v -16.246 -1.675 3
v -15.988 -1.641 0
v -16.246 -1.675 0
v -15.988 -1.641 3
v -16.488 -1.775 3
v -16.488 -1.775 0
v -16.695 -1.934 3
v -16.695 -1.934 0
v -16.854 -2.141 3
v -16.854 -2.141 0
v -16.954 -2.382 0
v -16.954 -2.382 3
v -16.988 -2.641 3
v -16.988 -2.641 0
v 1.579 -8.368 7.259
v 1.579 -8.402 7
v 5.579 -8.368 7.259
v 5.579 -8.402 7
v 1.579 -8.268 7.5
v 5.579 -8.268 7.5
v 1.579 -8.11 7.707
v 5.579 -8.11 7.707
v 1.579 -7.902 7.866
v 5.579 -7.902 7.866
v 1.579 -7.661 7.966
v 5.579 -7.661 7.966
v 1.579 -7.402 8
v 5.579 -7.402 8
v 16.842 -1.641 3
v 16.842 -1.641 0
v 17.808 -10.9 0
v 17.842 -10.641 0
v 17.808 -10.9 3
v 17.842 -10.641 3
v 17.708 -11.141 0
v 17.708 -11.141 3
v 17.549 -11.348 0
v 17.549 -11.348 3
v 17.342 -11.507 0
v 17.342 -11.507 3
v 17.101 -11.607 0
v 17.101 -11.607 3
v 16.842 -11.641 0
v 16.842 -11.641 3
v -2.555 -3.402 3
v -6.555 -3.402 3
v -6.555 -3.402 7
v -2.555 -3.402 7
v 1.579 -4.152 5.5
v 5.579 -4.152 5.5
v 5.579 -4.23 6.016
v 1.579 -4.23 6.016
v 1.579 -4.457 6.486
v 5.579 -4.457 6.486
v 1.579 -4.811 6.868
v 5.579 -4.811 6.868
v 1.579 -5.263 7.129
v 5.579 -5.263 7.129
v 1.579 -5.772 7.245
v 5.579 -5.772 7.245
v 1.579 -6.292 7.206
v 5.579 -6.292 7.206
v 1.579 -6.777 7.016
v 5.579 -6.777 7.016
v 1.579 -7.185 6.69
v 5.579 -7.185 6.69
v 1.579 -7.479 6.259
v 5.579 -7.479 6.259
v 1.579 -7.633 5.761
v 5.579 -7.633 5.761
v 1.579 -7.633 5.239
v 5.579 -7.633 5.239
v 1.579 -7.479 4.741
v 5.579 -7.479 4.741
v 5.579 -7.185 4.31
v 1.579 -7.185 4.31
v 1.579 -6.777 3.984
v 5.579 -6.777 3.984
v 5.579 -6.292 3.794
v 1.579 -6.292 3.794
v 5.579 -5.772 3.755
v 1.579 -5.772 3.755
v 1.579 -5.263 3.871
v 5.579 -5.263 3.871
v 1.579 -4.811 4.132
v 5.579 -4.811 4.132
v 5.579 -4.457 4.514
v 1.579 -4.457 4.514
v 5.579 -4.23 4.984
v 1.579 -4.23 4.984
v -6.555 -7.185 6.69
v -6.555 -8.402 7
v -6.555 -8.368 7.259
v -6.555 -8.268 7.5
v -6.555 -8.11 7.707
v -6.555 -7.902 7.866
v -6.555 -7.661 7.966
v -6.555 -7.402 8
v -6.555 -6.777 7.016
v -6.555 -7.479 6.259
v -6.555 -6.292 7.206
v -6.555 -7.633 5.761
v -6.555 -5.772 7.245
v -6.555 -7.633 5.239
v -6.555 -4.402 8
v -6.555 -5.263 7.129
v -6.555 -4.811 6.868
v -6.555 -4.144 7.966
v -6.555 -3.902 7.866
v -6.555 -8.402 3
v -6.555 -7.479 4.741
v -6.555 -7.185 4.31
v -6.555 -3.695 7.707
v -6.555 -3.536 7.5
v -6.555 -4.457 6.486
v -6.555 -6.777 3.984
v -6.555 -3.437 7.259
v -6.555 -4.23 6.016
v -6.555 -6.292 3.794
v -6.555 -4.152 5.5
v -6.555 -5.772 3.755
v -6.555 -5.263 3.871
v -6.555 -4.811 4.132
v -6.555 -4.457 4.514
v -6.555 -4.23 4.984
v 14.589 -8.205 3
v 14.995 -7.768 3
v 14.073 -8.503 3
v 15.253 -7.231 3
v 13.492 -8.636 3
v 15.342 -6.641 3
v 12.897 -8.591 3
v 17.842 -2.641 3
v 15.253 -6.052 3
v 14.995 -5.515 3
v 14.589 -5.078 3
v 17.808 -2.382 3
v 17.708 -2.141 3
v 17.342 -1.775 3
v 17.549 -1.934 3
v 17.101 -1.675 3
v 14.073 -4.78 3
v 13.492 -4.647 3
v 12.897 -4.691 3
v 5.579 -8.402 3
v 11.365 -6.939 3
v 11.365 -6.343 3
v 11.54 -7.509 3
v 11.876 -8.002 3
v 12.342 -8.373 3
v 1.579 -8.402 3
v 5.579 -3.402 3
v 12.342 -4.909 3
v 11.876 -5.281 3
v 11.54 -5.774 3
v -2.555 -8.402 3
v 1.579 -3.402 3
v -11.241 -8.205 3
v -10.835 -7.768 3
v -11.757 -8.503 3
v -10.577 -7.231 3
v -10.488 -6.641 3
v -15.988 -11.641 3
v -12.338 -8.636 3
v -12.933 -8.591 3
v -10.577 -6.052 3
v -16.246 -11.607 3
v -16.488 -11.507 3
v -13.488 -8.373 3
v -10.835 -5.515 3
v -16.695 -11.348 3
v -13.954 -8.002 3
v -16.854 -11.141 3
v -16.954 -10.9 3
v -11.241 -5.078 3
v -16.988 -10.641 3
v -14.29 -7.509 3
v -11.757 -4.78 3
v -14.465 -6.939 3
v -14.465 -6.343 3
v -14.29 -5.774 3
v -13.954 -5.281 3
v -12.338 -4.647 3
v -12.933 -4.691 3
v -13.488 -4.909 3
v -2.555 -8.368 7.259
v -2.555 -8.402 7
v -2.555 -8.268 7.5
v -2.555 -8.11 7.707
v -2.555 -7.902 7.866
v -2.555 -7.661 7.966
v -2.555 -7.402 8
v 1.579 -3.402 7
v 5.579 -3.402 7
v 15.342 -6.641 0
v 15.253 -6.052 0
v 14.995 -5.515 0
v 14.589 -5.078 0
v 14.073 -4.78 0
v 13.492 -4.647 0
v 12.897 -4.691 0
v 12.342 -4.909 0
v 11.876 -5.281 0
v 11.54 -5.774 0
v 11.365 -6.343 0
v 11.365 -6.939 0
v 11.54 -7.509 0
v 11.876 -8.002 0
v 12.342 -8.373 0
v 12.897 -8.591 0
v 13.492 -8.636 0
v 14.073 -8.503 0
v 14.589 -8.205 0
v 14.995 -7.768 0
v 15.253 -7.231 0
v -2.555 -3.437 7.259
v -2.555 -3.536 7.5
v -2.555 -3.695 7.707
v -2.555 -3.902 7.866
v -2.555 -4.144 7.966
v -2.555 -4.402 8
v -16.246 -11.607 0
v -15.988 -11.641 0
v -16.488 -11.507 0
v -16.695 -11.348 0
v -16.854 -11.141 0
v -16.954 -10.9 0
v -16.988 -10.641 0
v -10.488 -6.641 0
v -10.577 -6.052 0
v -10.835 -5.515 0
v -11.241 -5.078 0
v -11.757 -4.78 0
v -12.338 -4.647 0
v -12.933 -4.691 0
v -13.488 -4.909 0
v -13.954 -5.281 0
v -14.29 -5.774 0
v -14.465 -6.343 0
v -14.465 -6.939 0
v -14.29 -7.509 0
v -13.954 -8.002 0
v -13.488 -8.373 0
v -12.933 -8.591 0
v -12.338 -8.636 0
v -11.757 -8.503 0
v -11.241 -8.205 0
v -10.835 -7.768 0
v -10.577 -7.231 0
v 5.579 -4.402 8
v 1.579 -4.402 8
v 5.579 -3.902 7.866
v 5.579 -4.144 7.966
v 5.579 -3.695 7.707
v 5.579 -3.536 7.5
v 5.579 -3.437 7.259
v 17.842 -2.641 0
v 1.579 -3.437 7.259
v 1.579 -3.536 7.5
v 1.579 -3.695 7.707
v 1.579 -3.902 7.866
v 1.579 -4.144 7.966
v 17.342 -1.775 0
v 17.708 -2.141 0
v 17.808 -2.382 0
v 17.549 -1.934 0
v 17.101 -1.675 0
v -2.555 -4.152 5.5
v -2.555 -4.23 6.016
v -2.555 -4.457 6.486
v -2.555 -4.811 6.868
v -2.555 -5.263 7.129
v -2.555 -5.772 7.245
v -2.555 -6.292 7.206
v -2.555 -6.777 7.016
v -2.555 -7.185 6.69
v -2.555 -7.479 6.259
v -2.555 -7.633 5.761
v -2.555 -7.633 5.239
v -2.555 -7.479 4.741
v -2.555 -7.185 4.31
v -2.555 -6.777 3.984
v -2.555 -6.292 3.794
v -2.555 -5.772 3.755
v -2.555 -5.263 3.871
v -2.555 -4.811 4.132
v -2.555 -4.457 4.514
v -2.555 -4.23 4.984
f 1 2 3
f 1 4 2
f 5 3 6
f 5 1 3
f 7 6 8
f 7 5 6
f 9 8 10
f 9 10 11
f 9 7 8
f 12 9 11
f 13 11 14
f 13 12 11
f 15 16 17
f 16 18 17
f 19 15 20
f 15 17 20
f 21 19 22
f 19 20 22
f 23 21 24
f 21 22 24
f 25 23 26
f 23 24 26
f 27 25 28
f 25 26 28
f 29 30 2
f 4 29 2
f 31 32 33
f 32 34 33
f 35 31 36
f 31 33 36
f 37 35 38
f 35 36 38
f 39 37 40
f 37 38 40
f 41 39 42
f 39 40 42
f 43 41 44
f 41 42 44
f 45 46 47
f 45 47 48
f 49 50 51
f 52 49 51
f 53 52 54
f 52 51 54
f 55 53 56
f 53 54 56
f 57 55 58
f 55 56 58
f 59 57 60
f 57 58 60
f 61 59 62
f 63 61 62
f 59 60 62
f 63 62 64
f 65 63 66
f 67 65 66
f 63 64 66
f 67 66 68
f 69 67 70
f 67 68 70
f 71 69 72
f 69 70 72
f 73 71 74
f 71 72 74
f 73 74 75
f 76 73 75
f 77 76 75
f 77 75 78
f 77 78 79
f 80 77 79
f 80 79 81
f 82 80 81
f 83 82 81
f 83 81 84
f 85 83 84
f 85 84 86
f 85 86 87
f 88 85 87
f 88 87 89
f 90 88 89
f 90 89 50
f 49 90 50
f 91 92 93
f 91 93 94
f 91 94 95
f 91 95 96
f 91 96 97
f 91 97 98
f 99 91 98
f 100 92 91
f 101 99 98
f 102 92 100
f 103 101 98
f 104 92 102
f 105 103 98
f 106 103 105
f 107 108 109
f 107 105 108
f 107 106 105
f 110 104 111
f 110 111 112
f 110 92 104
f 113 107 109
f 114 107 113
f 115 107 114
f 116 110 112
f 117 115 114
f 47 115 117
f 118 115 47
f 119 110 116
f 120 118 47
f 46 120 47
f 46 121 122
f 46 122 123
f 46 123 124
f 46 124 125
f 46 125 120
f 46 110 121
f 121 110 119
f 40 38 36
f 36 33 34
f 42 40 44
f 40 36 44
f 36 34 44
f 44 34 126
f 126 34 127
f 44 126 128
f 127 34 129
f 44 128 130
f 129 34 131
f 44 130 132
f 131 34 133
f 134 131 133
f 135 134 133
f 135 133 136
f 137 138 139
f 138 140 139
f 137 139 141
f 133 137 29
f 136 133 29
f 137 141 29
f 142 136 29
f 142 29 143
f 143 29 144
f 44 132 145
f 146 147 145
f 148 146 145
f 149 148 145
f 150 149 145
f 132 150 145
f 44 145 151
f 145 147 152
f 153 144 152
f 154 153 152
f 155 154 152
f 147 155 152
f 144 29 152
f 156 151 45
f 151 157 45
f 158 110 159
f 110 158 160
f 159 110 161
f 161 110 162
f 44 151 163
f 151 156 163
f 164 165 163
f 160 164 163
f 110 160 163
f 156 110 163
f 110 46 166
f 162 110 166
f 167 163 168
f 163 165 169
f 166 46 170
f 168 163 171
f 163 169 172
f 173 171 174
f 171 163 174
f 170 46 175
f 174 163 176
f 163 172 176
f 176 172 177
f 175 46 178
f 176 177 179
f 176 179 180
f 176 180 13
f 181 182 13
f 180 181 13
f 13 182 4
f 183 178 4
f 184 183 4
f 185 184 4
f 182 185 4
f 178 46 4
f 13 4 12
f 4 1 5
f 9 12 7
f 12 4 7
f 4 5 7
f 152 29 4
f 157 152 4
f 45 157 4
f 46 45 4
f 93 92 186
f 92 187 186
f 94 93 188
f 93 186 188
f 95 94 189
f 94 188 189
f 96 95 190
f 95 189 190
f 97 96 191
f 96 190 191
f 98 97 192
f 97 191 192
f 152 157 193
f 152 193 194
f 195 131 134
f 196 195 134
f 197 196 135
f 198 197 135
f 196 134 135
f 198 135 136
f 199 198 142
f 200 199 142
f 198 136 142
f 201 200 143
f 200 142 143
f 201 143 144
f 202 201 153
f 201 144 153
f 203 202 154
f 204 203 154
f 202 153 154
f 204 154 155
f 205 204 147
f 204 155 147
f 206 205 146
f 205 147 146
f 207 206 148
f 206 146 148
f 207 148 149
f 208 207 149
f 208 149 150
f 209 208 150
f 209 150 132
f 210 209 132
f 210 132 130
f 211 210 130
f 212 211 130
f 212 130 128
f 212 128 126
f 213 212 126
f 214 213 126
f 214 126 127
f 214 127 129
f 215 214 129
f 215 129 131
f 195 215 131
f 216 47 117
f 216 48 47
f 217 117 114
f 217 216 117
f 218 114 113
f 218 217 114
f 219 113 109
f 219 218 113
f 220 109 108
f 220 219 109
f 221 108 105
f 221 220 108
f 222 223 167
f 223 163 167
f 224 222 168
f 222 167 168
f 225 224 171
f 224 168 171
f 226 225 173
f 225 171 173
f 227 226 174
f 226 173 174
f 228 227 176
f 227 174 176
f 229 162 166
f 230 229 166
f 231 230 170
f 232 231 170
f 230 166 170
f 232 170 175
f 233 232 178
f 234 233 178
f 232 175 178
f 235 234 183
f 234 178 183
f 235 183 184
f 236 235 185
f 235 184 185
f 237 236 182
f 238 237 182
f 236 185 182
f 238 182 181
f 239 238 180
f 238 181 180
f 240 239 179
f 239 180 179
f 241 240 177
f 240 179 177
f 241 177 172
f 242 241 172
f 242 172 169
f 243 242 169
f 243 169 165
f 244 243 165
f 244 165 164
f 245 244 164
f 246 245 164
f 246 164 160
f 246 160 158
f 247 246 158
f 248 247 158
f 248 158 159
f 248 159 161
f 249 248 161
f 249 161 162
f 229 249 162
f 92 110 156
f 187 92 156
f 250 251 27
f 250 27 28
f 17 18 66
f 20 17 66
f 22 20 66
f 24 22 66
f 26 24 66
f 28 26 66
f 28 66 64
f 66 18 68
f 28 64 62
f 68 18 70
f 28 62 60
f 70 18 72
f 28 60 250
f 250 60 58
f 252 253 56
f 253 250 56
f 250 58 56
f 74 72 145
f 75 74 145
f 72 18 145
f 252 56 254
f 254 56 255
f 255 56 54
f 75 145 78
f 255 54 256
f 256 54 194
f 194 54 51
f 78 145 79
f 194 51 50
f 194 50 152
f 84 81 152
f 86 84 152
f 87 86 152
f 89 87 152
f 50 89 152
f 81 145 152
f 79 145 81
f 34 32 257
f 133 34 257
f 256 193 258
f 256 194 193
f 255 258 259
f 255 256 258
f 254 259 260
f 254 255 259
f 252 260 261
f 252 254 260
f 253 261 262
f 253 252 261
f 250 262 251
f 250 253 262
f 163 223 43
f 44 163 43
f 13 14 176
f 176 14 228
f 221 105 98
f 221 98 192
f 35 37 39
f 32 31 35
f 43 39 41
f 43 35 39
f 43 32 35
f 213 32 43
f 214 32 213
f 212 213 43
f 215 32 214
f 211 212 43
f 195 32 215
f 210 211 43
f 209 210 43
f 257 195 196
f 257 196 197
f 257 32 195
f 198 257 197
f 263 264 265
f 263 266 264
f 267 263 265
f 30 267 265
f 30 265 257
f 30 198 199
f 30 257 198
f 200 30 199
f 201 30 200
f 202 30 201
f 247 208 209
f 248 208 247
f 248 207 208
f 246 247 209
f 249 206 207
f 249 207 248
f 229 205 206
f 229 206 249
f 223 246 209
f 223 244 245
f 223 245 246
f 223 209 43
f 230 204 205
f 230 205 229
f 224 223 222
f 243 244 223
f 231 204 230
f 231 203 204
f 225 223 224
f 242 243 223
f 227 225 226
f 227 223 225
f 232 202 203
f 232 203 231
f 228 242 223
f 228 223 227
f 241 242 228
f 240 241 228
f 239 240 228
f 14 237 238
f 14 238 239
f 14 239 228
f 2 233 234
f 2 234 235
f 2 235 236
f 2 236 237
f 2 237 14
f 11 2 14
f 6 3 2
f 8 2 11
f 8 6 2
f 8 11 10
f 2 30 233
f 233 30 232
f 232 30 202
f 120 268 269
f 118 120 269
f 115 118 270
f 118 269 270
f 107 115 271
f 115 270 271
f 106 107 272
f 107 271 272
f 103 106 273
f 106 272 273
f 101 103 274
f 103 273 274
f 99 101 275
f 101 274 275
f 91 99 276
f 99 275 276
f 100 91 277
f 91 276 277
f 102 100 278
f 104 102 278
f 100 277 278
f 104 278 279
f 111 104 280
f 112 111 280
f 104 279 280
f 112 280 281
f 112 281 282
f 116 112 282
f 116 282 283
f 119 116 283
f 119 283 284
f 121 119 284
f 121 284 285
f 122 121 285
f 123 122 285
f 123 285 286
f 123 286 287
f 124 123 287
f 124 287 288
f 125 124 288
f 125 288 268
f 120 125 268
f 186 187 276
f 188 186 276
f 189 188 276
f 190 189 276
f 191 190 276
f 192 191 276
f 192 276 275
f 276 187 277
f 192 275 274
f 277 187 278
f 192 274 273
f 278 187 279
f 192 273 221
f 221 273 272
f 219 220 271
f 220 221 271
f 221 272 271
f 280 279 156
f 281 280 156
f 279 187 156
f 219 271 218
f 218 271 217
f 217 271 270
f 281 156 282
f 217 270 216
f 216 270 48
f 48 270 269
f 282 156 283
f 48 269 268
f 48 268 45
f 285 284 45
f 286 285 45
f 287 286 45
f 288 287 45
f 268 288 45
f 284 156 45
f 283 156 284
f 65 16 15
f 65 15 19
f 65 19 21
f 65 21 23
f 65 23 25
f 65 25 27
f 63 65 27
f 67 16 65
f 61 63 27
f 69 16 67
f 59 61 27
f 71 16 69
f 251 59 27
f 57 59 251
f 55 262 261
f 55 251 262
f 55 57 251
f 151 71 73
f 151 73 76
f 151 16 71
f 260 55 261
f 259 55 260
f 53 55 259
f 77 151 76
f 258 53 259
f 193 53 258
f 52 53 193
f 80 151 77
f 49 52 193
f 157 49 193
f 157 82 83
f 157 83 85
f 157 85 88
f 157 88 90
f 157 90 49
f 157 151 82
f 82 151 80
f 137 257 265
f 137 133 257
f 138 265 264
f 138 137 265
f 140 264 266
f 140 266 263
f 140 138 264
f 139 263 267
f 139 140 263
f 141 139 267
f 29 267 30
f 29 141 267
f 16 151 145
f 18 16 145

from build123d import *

# Parameters (mm, degrees)
BOSS_EXTRUDE1_DEPTH = 3
SKETCH2_W           = 4
SKETCH2_H           = 5
BOSS_EXTRUDE2_DEPTH = 5
SKETCH3_R           = 1.75
CUT_EXTRUDE1_DEPTH  = 14
FILLET1_R           = 1
SKETCH5_R           = 2
CUT_EXTRUDE2_DEPTH  = 5
SKETCH7_R           = 2
CUT_EXTRUDE3_DEPTH  = 5
FILLET2_R           = 1


with BuildPart() as part:
    # Sketch1 → Boss-Extrude1 (new body)
    with BuildSketch(Plane.XY):
        Polygon((17.84234206, -3.321281539), (17.84234206, -10.791281539), (17.84234206, -11.641281539), (16.99234206, -11.641281539), (-15.30765794, -11.641281539), (-16.98765794, -11.641281539), (-16.98765794, -9.505481629), (-16.98765794, -2.491281539), (-16.98765794, -1.641281539), (-16.13765794, -1.641281539), (16.16234206, -1.641281539), (17.84234206, -1.641281539), align=None)
    extrude(amount=BOSS_EXTRUDE1_DEPTH)

    # Sketch2 → Boss-Extrude2 (add)
    with BuildSketch(Plane.XY.offset(3)):
        with Locations((-4.554565942, -5.902432564)):
            Rectangle(SKETCH2_W, SKETCH2_H)
        with Locations((3.578766058, -5.902432564)):
            Rectangle(SKETCH2_W, SKETCH2_H)
    extrude(amount=BOSS_EXTRUDE2_DEPTH)

    # Sketch3 → Cut-Extrude1 (cut)
    with BuildSketch(Plane(origin=(5.578766058, 0, 0), x_dir=(0, 0, -1), z_dir=(1, 0, 0))):
        with Locations(Location((-5.5, -5.902432564, 0), (0, 0, 90))):
            Circle(SKETCH3_R)
    extrude(amount=-CUT_EXTRUDE1_DEPTH, mode=Mode.SUBTRACT)

    # Fillet1
    fillet1_edges = [part.edges().sort_by_distance(p)[0] for p in [
        (-16.98765794, -11.641281539, 1.5),
        (-16.98765794, -1.641281539, 1.5),
        (17.84234206, -1.641281539, 1.5),
        (17.84234206, -11.641281539, 1.5),
    ]]
    fillet(fillet1_edges, radius=FILLET1_R)

    # Sketch5 → Cut-Extrude2 (cut)
    with BuildSketch(Plane.XY.offset(3)):
        with Locations((-12.48765794, -6.641281539)):
            Circle(SKETCH5_R)
    extrude(amount=-CUT_EXTRUDE2_DEPTH, mode=Mode.SUBTRACT)

    # Sketch7 → Cut-Extrude3 (cut)
    with BuildSketch(Plane.XY.offset(3)):
        with Locations((13.34234206, -6.641281539)):
            Circle(SKETCH7_R)
    extrude(amount=-CUT_EXTRUDE3_DEPTH, mode=Mode.SUBTRACT)

    # Fillet2
    fillet2_edges = [part.edges().sort_by_distance(p)[0] for p in [
        (-4.554565942, -8.402432564, 8),
        (-4.554565942, -3.402432564, 8),
        (3.578766058, -3.402432564, 8),
        (3.578766058, -8.402432564, 8),
    ]]
    fillet(fillet2_edges, radius=FILLET2_R)


solid = part.part
